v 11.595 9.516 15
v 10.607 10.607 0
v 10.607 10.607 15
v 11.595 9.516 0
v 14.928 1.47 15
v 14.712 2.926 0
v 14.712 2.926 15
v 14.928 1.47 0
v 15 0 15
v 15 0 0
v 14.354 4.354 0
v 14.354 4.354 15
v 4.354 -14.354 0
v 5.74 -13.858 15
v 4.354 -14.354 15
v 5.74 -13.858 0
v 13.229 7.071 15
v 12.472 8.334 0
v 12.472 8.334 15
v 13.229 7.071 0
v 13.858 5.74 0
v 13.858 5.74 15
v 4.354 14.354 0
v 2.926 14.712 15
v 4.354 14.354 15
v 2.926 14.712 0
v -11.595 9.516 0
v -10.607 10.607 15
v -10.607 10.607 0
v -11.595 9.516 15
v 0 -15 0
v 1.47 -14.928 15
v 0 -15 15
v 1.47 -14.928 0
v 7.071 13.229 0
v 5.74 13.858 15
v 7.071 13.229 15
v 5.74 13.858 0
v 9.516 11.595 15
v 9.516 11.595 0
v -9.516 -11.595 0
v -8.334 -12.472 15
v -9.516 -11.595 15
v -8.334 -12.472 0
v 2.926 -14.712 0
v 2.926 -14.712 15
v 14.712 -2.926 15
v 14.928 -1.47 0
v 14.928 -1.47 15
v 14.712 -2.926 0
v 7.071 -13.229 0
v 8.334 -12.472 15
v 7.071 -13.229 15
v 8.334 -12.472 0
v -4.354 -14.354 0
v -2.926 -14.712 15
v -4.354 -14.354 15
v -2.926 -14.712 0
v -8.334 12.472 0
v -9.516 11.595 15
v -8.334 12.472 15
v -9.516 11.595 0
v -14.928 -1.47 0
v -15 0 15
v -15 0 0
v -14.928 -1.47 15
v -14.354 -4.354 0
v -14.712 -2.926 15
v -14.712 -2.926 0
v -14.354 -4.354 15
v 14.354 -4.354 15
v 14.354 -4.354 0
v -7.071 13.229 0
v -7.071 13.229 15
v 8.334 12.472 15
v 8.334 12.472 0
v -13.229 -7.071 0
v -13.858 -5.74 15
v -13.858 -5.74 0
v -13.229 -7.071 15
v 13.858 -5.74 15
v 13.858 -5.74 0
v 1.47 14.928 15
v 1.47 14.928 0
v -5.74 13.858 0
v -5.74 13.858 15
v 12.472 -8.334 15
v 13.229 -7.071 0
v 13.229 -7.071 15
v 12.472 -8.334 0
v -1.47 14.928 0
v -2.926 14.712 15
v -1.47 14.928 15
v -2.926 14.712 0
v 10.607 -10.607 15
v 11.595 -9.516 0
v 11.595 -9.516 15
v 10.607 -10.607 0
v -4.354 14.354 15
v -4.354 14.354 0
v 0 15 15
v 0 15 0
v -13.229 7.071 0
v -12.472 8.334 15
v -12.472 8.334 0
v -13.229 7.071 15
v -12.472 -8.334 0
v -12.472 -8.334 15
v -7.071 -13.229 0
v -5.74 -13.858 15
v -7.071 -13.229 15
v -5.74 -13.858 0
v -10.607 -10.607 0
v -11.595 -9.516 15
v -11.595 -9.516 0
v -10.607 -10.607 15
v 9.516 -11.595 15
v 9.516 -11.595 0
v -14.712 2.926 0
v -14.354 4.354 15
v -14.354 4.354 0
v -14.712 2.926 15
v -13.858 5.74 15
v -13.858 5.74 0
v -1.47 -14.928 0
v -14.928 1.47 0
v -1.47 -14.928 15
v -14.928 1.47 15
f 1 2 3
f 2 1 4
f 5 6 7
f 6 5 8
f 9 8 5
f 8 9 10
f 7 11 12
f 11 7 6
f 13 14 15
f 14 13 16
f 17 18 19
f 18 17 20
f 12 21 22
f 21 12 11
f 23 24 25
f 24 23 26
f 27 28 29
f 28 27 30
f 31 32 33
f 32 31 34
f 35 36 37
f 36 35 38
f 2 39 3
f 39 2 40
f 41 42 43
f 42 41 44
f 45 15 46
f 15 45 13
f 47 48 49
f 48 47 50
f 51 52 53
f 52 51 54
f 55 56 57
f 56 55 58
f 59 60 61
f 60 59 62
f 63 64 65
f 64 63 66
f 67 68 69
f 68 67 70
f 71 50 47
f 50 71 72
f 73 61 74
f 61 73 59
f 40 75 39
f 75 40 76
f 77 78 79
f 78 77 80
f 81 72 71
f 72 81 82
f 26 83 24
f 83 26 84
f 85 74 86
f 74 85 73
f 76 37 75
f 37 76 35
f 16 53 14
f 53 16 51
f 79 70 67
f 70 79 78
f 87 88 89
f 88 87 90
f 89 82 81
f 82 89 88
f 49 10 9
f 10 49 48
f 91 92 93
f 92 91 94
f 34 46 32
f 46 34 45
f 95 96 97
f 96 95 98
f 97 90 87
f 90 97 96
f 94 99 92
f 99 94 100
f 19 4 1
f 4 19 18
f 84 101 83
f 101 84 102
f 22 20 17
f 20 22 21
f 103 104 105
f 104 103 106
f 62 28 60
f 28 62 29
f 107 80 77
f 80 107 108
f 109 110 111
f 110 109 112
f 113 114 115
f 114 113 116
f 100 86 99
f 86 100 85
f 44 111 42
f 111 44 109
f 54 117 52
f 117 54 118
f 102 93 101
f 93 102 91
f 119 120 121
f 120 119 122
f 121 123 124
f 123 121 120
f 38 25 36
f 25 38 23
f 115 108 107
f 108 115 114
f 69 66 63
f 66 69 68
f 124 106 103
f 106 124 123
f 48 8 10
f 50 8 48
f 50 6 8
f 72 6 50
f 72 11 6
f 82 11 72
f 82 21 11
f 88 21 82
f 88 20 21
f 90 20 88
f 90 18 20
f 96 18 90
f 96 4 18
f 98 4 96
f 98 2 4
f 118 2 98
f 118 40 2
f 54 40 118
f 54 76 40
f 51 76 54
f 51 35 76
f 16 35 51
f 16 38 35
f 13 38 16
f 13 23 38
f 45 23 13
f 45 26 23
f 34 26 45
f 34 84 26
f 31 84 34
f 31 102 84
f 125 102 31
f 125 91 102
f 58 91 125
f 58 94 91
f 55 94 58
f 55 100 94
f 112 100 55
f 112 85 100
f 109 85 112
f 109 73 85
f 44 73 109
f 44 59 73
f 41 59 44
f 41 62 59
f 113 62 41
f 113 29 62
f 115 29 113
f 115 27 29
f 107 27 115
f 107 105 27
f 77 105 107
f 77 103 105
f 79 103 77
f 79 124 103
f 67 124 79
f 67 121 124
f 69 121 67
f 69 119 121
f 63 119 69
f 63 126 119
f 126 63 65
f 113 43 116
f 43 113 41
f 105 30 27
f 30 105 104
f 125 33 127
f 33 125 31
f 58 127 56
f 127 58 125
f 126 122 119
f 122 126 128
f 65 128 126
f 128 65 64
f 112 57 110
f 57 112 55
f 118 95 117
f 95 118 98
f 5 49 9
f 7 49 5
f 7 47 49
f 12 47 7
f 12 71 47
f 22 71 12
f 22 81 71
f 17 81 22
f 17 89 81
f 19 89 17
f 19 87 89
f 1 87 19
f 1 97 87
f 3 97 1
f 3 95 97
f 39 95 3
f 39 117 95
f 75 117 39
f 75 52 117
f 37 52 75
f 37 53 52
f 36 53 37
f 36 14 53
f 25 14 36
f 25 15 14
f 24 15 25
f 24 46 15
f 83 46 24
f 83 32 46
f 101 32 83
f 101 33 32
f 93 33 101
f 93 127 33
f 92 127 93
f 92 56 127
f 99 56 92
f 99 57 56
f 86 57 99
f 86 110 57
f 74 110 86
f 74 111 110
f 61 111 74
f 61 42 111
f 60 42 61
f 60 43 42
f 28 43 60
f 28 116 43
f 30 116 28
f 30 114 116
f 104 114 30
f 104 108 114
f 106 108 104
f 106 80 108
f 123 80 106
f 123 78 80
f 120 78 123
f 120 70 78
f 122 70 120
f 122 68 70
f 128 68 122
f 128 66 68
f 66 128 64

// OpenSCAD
// Replacement knob for hotplate stirrer
// Dimensions measured with calipers

// Main knob dimensions
knob_diameter = 30;
knob_radius = knob_diameter / 2;
knob_height = 15;

// D-shaft blind bore dimensions
bore_diameter = 6.2;
bore_radius = bore_diameter / 2;
bore_depth = 12;
// Distance from flat to opposite side of circle is 4.7 mm
// This means the flat is offset from the center by (radius - 4.7)
bore_flat_offset = bore_radius - 4.7; // 3.1 - 4.7 = -1.6 mm (flat is 1.6 mm below center)

// Grip grooves
num_grooves = 18;
groove_diameter = 2;
groove_radius = groove_diameter / 2;

// Pointer groove on top face
pointer_width = 1.5;
pointer_depth = 1;
pointer_length = knob_radius; // from center to edge

// Print quality
$fn = 64;

// Main knob body
translate([0, 0, 0])
cylinder(h = knob_height, r = knob_radius, center = false);

// D-shaped blind bore (cut from bottom up)
// The bore is a cylinder with a flat side
// We subtract a cylinder and then add back the part that was cut by the flat
// Actually, we subtract the D-shape directly using difference

difference() {
    // This is handled in the main difference below
}

// Full assembly with all cuts
difference() {
    // Main knob
    cylinder(h = knob_height, r = knob_radius, center = false);
    
    // D-shaped blind bore
    // The D-shape: a circle with a flat side
    // The flat is on one side, offset from center
    // We create the D-shape by taking a cylinder and cutting it with a half-space
    // The flat is at y = -bore_flat_offset (since offset is negative, flat is below center)
    // Actually, let's think: distance from flat to opposite side is 4.7 mm
    // Circle diameter is 6.2 mm, so from center to opposite side is 3.1 mm
    // From flat to center is 4.7 - 3.1 = 1.6 mm
    // So the flat is 1.6 mm from the center, on the side towards negative y
    
    // Create D-shape bore: cylinder minus a rectangular block that cuts the flat
    translate([0, 0, 0]) {
        // First, the cylindrical part of the bore
        cylinder(h = bore_depth + 0.1, r = bore_radius, center = false);
        
        // Now we need to make it D-shaped by cutting a flat
        // The flat is at y = -1.6 mm (1.6 mm below center)
        // We cut everything below y = -1.6 mm within the bore region
        // To do this, we subtract a half-space, but OpenSCAD doesn't have half-spaces
        // Instead, we can use a large box that cuts the flat
        
        // Actually, let's reconsider: the D-shape means we keep the part of the circle
        // above the flat line. So we need to subtract the part below the flat.
        // We'll create a shape that represents the "missing" part and subtract it.
        
        // The missing part is a rectangular prism that extends from the flat line
        // to the bottom of the circle, but only within the bore depth
        
        // Let's use a different approach: create the D-shape as a union of a half-cylinder
        // and a rectangular prism, then subtract that.
        
        // Actually, the simplest way: subtract a cylinder, then add back the part that
        // should remain (the part below the flat). No, that's not right either.
        
        // Let me think again. The D-shape bore means the hole has a flat side.
        // The flat is 1.6 mm from the center. So the hole is the intersection of
        // a cylinder and a half-space (y >= -1.6).
        
        // To create this in OpenSCAD, we can:
        // 1. Create a cylinder
        // 2. Intersect it with a half-space (represented by a large box)
        
        // But we're in a difference, so we need to subtract the D-shape.
        // Let's create the D-shape as a separate module and subtract it.
    }
    
    // Let me restructure: create the D-shape bore as a separate solid
    // and subtract it.
}

// Let me rewrite this more carefully

difference() {
    // Main knob
    cylinder(h = knob_height, r = knob_radius, center = false);
    
    // D-shaped blind bore
    // Create D-shape: cylinder intersected with half-space
    translate([0, 0, 0]) {
        intersection() {
            cylinder(h = bore_depth + 0.1, r = bore_radius, center = false);
            // Half-space: y >= -bore_flat_offset
            // Represent as a large box
            translate([0, -bore_flat_offset, 0])
            cube([knob_diameter + 2, knob_diameter + 2, bore_depth + 1], center = false);
        }
    }
    
    // Grip grooves: 18 evenly spaced vertical half-cylinders on the outer surface
    for (i = [0 : num_grooves - 1]) {
        angle = i * 360 / num_grooves;
        // Position the groove on the outer surface
        // The groove is a half-cylinder centered on the surface
        // So its center is at radius = knob_radius - groove_radius/2? 
        // No, "centred on the outer surface" means the center of the half-cylinder
        // is on the surface, so half of it is inside and half outside.
        // For a half-cylinder groove, we want the flat side facing outward.
        
        translate([0, 0, 0])
        rotate([0, 0, angle])
        translate([knob_radius, 0, knob_height / 2])
        rotate([90, 0, 0])
        // Half-cylinder: cylinder intersected with half-space
        intersection() {
            cylinder(h = knob_height + 0.1, r = groove_radius, center = true);
            // Keep the part facing inward (negative x in local coords)
            translate([-groove_radius, 0, 0])
            cube([groove_radius + 1, groove_radius + 1, knob_height + 1], center = false);
        }
    }
    
    // Pointer groove on top face
    // 1.5 mm wide, 1 mm deep, from center to edge
    // On the same side as the flat of the D (negative y side)
    translate([0, 0, knob_height]) {
        // Slot: rectangular prism
        // Width in y-direction (along the radius), length in y-direction
        // Actually, it runs from center to edge along the same side as the flat
        // The flat is on the negative y side, so the groove goes from (0,0) to (0, -knob_radius)
        
        // Create a slot that is 1.5 mm wide (in x-direction) and runs along y
        translate([-pointer_width / 2, -pointer_length / 2, -pointer_depth / 2])
        cube([pointer_width + 0.1, pointer_length + 0.1, pointer_depth + 0.1], center = false);
    }
}
